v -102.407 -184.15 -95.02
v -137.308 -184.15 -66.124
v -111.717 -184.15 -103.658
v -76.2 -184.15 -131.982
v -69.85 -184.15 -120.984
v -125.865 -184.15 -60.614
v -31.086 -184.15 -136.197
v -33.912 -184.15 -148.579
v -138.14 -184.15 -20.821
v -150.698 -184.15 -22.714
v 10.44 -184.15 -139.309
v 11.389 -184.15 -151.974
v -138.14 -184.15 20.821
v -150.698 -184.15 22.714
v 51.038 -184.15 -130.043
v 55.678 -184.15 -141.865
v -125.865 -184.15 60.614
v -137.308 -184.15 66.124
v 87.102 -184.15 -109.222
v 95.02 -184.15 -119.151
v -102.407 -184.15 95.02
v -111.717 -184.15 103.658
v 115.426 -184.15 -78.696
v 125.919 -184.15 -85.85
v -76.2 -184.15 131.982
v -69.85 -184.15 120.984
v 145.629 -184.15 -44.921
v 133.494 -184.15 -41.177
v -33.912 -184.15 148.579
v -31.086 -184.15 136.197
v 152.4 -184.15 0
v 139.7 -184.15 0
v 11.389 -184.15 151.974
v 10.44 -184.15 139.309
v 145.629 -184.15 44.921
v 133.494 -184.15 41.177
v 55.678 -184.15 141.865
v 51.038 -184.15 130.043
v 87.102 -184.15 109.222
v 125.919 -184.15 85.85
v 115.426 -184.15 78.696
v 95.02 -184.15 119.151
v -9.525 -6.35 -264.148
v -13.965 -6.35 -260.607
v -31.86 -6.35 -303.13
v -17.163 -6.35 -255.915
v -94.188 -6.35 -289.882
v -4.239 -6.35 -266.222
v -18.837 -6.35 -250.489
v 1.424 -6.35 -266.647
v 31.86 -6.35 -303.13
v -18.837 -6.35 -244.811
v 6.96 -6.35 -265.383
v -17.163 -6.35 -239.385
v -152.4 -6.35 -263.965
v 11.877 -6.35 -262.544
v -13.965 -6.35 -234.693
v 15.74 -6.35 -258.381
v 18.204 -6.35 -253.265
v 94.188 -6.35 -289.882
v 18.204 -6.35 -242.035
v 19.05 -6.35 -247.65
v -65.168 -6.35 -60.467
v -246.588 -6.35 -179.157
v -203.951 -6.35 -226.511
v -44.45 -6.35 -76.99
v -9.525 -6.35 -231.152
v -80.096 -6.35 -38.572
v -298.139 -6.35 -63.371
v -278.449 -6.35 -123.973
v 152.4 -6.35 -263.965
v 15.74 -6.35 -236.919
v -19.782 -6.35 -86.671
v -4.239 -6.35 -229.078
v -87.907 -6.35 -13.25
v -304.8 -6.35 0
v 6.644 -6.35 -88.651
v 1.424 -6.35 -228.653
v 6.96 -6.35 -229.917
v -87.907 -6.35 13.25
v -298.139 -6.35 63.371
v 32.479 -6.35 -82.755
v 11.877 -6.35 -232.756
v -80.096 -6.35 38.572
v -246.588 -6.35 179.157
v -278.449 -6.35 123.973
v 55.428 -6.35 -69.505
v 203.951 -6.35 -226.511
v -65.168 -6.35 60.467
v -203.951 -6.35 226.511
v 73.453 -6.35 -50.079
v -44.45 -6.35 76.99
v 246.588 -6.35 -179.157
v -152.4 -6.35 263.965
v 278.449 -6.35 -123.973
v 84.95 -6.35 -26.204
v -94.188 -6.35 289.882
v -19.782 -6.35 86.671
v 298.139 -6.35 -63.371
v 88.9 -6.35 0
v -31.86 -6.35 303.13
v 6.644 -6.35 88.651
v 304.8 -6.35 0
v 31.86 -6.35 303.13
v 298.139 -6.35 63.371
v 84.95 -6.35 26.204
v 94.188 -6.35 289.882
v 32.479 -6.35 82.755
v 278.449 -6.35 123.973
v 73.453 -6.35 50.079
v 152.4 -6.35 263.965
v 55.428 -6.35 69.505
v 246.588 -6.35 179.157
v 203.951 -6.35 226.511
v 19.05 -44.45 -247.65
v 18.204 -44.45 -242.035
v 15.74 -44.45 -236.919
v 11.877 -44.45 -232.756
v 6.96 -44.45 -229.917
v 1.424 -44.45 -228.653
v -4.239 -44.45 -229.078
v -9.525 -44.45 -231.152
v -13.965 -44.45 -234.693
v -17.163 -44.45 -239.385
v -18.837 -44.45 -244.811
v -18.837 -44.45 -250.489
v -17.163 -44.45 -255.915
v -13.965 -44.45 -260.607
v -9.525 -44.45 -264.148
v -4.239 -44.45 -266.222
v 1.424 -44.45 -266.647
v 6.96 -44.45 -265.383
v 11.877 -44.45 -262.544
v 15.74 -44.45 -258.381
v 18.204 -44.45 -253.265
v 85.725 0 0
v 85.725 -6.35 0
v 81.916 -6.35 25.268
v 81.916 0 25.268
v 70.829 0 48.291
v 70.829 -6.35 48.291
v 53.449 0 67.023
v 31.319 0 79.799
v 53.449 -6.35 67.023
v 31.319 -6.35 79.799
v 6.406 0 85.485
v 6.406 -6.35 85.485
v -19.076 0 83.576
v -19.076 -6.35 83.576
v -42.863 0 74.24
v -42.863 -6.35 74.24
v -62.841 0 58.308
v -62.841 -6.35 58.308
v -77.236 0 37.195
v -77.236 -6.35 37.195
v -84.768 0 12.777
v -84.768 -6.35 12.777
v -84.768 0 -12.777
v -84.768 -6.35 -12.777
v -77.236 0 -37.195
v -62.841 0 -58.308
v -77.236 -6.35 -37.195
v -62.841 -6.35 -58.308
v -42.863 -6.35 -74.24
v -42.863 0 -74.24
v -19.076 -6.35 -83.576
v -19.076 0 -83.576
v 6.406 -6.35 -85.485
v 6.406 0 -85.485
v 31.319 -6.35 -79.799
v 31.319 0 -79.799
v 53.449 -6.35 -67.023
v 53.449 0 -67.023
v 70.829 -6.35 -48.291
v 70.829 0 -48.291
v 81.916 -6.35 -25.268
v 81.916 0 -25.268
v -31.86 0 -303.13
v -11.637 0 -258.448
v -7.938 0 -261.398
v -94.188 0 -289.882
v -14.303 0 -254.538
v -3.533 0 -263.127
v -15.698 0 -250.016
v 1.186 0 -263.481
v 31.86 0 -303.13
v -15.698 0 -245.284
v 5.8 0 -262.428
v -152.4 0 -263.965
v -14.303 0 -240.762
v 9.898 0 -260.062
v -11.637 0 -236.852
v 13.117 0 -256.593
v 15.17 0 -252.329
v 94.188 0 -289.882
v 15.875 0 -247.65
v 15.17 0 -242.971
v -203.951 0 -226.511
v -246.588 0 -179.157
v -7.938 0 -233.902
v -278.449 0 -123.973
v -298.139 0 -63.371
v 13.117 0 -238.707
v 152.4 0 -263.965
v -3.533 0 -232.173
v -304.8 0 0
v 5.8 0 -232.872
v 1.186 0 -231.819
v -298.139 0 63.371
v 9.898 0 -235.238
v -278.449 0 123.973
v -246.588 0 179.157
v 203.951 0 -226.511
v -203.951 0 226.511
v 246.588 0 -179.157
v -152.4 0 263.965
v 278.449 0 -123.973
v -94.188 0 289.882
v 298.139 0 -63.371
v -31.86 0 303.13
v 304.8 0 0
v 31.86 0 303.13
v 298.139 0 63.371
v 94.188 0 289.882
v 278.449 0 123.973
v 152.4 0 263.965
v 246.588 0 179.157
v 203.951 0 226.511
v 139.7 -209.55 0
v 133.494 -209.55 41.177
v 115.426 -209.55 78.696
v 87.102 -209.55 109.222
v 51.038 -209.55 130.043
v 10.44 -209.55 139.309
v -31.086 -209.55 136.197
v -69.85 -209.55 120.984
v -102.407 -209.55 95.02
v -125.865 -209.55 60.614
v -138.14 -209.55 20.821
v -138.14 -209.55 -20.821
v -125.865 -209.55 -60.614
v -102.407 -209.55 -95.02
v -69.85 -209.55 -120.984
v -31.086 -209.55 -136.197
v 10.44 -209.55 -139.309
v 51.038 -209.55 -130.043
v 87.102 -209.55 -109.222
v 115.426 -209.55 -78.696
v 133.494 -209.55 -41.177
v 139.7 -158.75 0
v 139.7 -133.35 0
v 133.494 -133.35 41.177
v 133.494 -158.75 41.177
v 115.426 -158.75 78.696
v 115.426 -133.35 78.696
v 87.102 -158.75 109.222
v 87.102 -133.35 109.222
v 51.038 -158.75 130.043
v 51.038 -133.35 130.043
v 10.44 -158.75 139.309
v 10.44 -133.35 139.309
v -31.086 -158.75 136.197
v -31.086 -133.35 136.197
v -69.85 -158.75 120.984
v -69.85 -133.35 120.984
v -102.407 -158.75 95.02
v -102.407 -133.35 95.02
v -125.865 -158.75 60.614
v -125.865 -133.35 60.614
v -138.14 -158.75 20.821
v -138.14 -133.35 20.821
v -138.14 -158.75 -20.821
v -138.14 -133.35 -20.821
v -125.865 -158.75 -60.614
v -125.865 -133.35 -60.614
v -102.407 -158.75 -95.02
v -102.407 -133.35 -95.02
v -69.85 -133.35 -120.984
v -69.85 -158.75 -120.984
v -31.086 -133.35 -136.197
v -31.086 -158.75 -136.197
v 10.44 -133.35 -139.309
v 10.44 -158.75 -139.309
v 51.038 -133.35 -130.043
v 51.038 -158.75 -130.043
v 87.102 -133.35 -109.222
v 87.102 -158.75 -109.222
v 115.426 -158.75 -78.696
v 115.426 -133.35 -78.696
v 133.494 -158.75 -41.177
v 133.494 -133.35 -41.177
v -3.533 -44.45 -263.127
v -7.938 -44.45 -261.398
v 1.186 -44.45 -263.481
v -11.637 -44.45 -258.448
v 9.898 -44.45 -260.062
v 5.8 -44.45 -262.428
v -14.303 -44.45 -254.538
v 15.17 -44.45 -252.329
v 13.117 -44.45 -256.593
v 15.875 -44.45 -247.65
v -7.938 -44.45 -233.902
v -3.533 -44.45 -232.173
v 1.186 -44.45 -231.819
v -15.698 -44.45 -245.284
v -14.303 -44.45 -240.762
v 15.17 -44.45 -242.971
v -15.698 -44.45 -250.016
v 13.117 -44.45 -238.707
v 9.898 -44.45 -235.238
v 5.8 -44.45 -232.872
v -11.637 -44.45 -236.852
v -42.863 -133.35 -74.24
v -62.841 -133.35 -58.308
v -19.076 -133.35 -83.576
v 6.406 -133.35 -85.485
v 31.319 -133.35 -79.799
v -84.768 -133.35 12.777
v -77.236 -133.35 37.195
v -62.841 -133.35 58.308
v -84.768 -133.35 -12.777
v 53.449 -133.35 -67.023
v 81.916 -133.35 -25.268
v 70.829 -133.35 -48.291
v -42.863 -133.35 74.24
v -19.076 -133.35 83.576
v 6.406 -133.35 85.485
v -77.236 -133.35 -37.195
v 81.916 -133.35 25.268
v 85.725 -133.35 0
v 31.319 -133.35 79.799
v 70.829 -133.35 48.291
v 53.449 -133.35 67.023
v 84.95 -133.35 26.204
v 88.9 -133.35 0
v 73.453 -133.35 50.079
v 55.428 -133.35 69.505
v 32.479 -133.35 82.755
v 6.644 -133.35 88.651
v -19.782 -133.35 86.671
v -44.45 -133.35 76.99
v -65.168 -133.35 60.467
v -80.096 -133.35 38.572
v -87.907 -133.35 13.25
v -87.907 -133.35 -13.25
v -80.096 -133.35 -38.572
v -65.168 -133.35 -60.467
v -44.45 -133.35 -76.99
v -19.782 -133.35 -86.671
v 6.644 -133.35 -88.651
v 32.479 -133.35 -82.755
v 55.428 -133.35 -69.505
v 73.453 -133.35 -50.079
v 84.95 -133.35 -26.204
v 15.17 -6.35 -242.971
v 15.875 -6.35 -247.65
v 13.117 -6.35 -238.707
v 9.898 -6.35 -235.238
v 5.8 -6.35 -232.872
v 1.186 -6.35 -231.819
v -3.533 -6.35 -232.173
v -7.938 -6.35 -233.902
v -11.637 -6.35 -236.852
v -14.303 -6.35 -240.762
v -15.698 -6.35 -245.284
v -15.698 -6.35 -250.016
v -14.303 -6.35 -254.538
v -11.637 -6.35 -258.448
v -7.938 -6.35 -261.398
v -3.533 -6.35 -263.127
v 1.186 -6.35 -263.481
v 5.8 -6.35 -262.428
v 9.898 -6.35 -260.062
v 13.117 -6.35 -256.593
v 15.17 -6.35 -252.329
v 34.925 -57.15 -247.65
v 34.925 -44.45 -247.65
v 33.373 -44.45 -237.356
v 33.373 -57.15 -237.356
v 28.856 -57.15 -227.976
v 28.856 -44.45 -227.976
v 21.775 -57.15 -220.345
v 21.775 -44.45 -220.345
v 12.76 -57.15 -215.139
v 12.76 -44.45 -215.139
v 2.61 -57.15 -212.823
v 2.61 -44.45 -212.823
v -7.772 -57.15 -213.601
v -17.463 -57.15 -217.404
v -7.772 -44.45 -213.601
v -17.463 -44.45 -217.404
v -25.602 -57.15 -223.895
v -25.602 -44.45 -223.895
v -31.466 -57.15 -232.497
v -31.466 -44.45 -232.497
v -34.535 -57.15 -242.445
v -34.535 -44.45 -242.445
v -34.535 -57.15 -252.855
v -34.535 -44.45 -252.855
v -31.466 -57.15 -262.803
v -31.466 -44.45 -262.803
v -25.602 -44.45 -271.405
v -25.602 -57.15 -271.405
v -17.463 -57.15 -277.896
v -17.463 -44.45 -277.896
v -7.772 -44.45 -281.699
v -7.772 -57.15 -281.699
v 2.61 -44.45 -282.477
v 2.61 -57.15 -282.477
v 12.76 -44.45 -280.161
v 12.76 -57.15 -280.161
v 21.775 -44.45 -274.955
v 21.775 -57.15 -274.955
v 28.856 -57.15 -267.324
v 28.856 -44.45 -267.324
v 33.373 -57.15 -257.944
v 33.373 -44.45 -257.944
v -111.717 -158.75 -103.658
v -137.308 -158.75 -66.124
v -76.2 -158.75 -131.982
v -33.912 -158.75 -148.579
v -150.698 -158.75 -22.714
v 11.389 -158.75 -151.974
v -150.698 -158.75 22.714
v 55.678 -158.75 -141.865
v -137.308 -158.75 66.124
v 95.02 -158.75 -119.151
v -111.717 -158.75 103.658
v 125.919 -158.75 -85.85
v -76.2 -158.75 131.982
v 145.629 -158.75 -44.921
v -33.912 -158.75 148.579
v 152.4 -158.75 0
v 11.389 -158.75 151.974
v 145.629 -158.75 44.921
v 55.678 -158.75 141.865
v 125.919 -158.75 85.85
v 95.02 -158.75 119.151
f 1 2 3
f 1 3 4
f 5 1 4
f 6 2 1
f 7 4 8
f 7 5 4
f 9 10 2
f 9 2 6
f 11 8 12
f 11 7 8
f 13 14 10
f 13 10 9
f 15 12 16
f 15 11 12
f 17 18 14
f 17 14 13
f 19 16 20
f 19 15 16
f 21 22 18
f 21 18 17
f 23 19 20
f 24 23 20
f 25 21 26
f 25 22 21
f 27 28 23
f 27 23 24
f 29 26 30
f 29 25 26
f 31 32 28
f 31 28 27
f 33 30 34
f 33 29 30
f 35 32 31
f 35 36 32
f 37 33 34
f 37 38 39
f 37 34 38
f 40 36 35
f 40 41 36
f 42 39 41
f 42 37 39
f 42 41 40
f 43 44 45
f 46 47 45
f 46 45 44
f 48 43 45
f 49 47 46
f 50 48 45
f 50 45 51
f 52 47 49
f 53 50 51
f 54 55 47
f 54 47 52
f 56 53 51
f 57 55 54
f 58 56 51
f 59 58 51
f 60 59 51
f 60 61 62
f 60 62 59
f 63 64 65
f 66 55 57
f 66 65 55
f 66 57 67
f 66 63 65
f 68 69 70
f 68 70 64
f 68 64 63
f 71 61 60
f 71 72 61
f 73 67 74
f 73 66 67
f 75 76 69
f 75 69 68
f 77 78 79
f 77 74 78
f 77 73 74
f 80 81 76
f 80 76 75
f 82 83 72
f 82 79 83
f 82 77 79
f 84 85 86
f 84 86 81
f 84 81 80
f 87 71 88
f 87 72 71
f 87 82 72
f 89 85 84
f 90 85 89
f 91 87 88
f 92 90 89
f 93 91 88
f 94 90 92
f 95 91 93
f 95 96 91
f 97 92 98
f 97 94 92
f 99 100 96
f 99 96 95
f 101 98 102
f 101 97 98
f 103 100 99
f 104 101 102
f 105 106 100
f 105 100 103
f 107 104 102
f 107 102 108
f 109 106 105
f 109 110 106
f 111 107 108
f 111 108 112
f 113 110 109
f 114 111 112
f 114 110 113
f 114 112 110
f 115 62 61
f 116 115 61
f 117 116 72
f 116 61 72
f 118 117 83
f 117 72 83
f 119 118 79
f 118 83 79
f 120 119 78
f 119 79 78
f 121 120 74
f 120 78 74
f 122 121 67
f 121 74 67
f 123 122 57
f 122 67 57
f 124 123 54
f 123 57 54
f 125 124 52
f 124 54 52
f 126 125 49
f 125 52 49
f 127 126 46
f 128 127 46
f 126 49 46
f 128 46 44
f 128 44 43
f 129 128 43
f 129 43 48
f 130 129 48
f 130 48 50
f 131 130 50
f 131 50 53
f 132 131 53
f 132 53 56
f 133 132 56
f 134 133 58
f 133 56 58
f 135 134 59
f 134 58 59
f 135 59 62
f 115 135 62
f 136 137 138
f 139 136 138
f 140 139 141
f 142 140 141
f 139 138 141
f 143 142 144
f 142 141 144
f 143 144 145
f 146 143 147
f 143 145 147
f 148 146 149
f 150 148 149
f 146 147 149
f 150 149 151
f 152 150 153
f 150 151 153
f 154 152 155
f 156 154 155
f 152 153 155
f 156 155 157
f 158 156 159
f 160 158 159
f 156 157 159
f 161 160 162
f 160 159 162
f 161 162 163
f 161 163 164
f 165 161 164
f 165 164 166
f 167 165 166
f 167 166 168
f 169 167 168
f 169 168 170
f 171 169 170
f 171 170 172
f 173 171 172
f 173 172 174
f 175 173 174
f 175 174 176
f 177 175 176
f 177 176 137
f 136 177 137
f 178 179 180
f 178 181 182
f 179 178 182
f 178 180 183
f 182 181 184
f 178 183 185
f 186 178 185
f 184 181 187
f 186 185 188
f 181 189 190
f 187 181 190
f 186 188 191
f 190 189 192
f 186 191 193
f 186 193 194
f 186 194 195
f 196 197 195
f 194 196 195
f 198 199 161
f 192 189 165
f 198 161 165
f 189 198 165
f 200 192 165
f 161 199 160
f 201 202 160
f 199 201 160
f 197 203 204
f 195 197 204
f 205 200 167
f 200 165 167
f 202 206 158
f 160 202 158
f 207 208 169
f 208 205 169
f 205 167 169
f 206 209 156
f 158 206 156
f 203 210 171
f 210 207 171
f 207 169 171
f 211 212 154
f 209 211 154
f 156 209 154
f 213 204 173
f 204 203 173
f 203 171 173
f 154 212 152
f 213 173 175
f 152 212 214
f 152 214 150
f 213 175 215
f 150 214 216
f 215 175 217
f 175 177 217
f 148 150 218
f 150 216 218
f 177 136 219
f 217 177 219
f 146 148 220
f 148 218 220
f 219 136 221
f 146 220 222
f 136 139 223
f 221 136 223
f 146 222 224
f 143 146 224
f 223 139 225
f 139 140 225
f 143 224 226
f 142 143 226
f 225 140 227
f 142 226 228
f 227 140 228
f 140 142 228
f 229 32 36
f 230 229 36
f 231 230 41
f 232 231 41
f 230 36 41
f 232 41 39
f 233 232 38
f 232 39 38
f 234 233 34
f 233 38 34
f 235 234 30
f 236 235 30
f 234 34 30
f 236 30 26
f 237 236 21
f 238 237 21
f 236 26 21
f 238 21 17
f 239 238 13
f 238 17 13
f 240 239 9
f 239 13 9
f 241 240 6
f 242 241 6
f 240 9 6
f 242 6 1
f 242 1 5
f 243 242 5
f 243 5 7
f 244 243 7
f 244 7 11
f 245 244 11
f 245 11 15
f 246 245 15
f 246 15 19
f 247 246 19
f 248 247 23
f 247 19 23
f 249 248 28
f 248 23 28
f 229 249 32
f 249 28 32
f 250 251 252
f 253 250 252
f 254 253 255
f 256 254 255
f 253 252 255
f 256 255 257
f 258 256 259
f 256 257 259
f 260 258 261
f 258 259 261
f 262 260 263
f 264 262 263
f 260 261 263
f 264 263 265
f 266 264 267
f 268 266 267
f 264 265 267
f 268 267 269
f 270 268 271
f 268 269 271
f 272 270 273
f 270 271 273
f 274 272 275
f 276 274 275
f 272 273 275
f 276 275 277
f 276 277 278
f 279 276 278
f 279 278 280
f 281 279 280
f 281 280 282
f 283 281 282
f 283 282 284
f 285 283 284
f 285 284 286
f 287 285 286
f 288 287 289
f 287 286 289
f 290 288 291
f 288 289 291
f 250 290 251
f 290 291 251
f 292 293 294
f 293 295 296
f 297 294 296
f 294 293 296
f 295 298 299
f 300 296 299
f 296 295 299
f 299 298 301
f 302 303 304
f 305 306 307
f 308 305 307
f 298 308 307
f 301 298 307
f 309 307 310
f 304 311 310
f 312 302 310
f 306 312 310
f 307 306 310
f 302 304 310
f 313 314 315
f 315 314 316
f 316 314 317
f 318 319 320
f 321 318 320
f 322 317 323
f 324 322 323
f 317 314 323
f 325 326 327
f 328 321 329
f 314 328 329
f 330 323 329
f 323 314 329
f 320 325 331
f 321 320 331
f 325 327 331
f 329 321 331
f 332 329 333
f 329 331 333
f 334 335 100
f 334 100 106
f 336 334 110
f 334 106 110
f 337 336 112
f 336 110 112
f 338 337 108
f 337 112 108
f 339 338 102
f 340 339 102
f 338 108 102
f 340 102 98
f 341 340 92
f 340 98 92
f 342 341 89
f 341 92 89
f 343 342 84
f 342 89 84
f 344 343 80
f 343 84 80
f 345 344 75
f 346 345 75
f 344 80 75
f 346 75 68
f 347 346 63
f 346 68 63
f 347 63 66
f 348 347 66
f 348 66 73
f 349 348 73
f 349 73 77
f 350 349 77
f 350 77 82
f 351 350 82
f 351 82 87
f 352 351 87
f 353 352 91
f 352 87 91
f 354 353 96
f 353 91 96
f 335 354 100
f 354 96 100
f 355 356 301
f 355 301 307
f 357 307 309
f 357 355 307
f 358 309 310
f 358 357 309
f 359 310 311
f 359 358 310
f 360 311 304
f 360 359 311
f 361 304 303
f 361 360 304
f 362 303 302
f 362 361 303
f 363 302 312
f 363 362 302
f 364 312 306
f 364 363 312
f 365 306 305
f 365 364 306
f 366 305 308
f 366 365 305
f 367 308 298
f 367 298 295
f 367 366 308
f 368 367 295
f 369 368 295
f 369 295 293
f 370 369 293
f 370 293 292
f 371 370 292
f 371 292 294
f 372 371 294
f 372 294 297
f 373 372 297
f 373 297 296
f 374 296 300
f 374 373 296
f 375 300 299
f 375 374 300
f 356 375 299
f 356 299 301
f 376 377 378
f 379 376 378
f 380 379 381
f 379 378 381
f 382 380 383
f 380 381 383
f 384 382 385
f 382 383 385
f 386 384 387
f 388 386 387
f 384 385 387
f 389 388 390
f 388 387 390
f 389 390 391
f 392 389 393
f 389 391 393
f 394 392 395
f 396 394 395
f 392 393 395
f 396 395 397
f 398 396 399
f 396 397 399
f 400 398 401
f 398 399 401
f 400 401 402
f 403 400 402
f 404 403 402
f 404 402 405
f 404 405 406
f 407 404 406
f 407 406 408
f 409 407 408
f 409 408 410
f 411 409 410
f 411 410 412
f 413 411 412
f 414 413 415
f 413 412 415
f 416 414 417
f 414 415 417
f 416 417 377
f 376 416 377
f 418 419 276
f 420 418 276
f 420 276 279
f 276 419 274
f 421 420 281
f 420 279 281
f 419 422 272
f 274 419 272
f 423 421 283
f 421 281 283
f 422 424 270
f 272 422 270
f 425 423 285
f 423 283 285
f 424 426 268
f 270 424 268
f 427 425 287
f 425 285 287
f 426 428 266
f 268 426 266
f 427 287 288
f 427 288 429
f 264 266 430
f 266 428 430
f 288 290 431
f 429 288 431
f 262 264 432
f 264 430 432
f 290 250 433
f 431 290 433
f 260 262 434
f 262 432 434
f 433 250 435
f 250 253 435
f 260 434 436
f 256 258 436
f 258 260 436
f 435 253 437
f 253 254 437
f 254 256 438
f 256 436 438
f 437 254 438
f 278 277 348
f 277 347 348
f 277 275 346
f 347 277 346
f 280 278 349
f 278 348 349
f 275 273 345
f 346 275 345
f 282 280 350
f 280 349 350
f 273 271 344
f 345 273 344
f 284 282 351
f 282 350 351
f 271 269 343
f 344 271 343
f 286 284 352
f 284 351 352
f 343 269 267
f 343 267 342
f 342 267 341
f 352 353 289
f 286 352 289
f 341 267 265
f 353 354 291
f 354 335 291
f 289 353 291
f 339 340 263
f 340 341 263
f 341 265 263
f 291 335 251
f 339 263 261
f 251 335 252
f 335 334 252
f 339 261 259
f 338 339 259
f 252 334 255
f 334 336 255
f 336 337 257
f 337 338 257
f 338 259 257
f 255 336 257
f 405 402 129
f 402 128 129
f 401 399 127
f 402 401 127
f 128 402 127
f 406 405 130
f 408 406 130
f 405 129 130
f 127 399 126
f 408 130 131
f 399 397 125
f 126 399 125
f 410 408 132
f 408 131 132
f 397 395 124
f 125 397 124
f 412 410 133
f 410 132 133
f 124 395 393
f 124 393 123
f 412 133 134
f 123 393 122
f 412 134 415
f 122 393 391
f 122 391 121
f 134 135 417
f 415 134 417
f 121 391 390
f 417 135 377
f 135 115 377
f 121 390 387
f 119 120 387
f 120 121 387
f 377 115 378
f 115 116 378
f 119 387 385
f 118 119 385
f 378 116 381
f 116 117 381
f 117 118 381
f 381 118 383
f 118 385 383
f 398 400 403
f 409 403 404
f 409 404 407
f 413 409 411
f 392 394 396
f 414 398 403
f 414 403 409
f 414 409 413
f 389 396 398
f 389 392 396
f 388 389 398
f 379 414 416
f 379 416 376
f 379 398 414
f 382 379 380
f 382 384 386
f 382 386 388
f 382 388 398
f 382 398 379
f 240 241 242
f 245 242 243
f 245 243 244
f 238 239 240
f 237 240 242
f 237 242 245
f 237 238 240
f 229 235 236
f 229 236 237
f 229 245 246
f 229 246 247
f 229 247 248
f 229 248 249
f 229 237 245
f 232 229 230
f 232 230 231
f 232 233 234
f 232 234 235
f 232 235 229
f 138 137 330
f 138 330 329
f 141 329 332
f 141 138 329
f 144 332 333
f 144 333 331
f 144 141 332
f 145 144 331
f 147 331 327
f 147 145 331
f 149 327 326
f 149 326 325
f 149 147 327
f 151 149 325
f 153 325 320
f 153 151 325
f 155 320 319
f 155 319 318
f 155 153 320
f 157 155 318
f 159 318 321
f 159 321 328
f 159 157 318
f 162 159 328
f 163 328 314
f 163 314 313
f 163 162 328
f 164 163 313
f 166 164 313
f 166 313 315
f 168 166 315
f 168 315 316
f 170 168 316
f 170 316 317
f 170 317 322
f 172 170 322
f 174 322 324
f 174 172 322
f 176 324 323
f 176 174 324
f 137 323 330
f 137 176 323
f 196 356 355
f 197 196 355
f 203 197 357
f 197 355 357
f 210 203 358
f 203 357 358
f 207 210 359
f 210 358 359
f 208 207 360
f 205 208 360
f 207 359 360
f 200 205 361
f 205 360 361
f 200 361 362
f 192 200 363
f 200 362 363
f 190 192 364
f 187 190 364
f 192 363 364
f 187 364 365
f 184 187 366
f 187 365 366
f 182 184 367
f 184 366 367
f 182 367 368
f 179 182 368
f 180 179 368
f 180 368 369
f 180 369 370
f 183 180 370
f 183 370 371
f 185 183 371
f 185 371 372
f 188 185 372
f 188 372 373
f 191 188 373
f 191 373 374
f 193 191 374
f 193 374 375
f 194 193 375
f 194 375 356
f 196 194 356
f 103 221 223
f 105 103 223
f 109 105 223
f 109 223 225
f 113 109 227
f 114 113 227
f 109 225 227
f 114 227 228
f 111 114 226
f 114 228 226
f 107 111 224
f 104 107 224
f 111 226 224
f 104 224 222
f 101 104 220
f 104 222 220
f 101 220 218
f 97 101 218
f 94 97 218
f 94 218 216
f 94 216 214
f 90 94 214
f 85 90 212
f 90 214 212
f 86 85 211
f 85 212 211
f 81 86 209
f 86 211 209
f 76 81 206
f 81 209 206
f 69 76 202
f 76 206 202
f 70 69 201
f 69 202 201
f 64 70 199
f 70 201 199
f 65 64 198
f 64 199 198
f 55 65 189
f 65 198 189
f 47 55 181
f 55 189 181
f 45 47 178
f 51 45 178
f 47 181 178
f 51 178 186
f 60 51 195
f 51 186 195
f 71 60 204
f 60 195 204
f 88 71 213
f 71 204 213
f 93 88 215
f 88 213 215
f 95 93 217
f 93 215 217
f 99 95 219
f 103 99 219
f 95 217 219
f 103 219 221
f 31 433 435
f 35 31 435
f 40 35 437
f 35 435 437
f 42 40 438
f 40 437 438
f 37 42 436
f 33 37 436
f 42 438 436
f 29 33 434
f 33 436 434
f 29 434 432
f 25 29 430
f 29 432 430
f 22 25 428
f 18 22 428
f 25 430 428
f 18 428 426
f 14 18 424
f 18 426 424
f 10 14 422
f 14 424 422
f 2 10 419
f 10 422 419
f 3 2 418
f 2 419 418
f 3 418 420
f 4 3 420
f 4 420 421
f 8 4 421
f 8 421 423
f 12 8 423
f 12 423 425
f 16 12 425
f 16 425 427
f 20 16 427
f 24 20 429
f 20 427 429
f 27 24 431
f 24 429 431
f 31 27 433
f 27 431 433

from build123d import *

# Parameters (mm, degrees)
F0_R      = 304.8
F1_DEPTH  = 6.35
F2_R      = 88.9
F2_R_2    = 85.725
F3_DEPTH  = 127
F4_DEPTH  = 25.4
F5_START  = 127
F2_R_3    = 139.7
F5_DEPTH  = 25.4
F6_START  = 152.4
F2_R_4    = 152.4
F6_DEPTH  = 25.4
F7_START  = 177.8
F7_DEPTH  = 25.4
F2_R_5    = 15.875
F8_DEPTH  = 25.4
F2_R_6    = 19.05
F9_DEPTH  = 38.1
F10_START = 38.1
F2_R_7    = 34.925
F10_DEPTH = 12.7


with BuildPart() as f1:
    # F0 (on Front) → F1 (new body)
    with BuildSketch(Plane.XZ):
        Circle(F0_R)
    extrude(amount=F1_DEPTH)

    # F2 (on face) → F3 (join)
    with BuildSketch(Plane.XZ.offset(6.35)):
        Circle(F2_R)
        Circle(F2_R_2, mode=Mode.SUBTRACT)
    extrude(amount=F3_DEPTH)

    # F2 (on face) → F4 (cut)
    with BuildSketch(Plane.XZ.offset(6.35)):
        Circle(F2_R_2)
    extrude(amount=-F4_DEPTH, mode=Mode.SUBTRACT)

    # F2 (on face) → F5 (join)
    with BuildSketch(Plane.XZ.offset(6.35).offset(F5_START)):
        Circle(F2_R_3)
        Circle(F2_R, mode=Mode.SUBTRACT)
        Circle(F2_R)
        Circle(F2_R_2, mode=Mode.SUBTRACT)
        Circle(F2_R_2)
    extrude(amount=F5_DEPTH)

    # F2 (on face) → F6 (join)
    with BuildSketch(Plane.XZ.offset(6.35).offset(F6_START)):
        Circle(F2_R_4)
        Circle(F2_R_3, mode=Mode.SUBTRACT)
        Circle(F2_R_3)
        Circle(F2_R, mode=Mode.SUBTRACT)
        Circle(F2_R)
        Circle(F2_R_2, mode=Mode.SUBTRACT)
        Circle(F2_R_2)
    extrude(amount=F6_DEPTH)

    # F2 (on face) → F7 (join)
    with BuildSketch(Plane.XZ.offset(6.35).offset(F7_START)):
        Circle(F2_R_3)
        Circle(F2_R, mode=Mode.SUBTRACT)
        Circle(F2_R)
        Circle(F2_R_2, mode=Mode.SUBTRACT)
        Circle(F2_R_2)
    extrude(amount=F7_DEPTH)

    # F2 (on face) → F8 (cut)
    with BuildSketch(Plane.XZ.offset(6.35)):
        with Locations((0, -247.65)):
            Circle(F2_R_5)
    extrude(amount=-F8_DEPTH, mode=Mode.SUBTRACT)

    # F2 (on face) → F9 (join)
    with BuildSketch(Plane.XZ.offset(6.35)):
        with Locations((0, -247.65)):
            Circle(F2_R_6)
        with Locations((0, -247.65)):
            Circle(F2_R_5, mode=Mode.SUBTRACT)
    extrude(amount=F9_DEPTH)

    # F2 (on face) → F10 (join)
    with BuildSketch(Plane.XZ.offset(6.35).offset(F10_START)):
        with Locations((0, -247.65)):
            Circle(F2_R_7)
        with Locations((0, -247.65)):
            Circle(F2_R_6, mode=Mode.SUBTRACT)
        with Locations((0, -247.65)):
            Circle(F2_R_6)
        with Locations((0, -247.65)):
            Circle(F2_R_5, mode=Mode.SUBTRACT)
        with Locations((0, -247.65)):
            Circle(F2_R_5)
    extrude(amount=F10_DEPTH)


solid = f1.part
